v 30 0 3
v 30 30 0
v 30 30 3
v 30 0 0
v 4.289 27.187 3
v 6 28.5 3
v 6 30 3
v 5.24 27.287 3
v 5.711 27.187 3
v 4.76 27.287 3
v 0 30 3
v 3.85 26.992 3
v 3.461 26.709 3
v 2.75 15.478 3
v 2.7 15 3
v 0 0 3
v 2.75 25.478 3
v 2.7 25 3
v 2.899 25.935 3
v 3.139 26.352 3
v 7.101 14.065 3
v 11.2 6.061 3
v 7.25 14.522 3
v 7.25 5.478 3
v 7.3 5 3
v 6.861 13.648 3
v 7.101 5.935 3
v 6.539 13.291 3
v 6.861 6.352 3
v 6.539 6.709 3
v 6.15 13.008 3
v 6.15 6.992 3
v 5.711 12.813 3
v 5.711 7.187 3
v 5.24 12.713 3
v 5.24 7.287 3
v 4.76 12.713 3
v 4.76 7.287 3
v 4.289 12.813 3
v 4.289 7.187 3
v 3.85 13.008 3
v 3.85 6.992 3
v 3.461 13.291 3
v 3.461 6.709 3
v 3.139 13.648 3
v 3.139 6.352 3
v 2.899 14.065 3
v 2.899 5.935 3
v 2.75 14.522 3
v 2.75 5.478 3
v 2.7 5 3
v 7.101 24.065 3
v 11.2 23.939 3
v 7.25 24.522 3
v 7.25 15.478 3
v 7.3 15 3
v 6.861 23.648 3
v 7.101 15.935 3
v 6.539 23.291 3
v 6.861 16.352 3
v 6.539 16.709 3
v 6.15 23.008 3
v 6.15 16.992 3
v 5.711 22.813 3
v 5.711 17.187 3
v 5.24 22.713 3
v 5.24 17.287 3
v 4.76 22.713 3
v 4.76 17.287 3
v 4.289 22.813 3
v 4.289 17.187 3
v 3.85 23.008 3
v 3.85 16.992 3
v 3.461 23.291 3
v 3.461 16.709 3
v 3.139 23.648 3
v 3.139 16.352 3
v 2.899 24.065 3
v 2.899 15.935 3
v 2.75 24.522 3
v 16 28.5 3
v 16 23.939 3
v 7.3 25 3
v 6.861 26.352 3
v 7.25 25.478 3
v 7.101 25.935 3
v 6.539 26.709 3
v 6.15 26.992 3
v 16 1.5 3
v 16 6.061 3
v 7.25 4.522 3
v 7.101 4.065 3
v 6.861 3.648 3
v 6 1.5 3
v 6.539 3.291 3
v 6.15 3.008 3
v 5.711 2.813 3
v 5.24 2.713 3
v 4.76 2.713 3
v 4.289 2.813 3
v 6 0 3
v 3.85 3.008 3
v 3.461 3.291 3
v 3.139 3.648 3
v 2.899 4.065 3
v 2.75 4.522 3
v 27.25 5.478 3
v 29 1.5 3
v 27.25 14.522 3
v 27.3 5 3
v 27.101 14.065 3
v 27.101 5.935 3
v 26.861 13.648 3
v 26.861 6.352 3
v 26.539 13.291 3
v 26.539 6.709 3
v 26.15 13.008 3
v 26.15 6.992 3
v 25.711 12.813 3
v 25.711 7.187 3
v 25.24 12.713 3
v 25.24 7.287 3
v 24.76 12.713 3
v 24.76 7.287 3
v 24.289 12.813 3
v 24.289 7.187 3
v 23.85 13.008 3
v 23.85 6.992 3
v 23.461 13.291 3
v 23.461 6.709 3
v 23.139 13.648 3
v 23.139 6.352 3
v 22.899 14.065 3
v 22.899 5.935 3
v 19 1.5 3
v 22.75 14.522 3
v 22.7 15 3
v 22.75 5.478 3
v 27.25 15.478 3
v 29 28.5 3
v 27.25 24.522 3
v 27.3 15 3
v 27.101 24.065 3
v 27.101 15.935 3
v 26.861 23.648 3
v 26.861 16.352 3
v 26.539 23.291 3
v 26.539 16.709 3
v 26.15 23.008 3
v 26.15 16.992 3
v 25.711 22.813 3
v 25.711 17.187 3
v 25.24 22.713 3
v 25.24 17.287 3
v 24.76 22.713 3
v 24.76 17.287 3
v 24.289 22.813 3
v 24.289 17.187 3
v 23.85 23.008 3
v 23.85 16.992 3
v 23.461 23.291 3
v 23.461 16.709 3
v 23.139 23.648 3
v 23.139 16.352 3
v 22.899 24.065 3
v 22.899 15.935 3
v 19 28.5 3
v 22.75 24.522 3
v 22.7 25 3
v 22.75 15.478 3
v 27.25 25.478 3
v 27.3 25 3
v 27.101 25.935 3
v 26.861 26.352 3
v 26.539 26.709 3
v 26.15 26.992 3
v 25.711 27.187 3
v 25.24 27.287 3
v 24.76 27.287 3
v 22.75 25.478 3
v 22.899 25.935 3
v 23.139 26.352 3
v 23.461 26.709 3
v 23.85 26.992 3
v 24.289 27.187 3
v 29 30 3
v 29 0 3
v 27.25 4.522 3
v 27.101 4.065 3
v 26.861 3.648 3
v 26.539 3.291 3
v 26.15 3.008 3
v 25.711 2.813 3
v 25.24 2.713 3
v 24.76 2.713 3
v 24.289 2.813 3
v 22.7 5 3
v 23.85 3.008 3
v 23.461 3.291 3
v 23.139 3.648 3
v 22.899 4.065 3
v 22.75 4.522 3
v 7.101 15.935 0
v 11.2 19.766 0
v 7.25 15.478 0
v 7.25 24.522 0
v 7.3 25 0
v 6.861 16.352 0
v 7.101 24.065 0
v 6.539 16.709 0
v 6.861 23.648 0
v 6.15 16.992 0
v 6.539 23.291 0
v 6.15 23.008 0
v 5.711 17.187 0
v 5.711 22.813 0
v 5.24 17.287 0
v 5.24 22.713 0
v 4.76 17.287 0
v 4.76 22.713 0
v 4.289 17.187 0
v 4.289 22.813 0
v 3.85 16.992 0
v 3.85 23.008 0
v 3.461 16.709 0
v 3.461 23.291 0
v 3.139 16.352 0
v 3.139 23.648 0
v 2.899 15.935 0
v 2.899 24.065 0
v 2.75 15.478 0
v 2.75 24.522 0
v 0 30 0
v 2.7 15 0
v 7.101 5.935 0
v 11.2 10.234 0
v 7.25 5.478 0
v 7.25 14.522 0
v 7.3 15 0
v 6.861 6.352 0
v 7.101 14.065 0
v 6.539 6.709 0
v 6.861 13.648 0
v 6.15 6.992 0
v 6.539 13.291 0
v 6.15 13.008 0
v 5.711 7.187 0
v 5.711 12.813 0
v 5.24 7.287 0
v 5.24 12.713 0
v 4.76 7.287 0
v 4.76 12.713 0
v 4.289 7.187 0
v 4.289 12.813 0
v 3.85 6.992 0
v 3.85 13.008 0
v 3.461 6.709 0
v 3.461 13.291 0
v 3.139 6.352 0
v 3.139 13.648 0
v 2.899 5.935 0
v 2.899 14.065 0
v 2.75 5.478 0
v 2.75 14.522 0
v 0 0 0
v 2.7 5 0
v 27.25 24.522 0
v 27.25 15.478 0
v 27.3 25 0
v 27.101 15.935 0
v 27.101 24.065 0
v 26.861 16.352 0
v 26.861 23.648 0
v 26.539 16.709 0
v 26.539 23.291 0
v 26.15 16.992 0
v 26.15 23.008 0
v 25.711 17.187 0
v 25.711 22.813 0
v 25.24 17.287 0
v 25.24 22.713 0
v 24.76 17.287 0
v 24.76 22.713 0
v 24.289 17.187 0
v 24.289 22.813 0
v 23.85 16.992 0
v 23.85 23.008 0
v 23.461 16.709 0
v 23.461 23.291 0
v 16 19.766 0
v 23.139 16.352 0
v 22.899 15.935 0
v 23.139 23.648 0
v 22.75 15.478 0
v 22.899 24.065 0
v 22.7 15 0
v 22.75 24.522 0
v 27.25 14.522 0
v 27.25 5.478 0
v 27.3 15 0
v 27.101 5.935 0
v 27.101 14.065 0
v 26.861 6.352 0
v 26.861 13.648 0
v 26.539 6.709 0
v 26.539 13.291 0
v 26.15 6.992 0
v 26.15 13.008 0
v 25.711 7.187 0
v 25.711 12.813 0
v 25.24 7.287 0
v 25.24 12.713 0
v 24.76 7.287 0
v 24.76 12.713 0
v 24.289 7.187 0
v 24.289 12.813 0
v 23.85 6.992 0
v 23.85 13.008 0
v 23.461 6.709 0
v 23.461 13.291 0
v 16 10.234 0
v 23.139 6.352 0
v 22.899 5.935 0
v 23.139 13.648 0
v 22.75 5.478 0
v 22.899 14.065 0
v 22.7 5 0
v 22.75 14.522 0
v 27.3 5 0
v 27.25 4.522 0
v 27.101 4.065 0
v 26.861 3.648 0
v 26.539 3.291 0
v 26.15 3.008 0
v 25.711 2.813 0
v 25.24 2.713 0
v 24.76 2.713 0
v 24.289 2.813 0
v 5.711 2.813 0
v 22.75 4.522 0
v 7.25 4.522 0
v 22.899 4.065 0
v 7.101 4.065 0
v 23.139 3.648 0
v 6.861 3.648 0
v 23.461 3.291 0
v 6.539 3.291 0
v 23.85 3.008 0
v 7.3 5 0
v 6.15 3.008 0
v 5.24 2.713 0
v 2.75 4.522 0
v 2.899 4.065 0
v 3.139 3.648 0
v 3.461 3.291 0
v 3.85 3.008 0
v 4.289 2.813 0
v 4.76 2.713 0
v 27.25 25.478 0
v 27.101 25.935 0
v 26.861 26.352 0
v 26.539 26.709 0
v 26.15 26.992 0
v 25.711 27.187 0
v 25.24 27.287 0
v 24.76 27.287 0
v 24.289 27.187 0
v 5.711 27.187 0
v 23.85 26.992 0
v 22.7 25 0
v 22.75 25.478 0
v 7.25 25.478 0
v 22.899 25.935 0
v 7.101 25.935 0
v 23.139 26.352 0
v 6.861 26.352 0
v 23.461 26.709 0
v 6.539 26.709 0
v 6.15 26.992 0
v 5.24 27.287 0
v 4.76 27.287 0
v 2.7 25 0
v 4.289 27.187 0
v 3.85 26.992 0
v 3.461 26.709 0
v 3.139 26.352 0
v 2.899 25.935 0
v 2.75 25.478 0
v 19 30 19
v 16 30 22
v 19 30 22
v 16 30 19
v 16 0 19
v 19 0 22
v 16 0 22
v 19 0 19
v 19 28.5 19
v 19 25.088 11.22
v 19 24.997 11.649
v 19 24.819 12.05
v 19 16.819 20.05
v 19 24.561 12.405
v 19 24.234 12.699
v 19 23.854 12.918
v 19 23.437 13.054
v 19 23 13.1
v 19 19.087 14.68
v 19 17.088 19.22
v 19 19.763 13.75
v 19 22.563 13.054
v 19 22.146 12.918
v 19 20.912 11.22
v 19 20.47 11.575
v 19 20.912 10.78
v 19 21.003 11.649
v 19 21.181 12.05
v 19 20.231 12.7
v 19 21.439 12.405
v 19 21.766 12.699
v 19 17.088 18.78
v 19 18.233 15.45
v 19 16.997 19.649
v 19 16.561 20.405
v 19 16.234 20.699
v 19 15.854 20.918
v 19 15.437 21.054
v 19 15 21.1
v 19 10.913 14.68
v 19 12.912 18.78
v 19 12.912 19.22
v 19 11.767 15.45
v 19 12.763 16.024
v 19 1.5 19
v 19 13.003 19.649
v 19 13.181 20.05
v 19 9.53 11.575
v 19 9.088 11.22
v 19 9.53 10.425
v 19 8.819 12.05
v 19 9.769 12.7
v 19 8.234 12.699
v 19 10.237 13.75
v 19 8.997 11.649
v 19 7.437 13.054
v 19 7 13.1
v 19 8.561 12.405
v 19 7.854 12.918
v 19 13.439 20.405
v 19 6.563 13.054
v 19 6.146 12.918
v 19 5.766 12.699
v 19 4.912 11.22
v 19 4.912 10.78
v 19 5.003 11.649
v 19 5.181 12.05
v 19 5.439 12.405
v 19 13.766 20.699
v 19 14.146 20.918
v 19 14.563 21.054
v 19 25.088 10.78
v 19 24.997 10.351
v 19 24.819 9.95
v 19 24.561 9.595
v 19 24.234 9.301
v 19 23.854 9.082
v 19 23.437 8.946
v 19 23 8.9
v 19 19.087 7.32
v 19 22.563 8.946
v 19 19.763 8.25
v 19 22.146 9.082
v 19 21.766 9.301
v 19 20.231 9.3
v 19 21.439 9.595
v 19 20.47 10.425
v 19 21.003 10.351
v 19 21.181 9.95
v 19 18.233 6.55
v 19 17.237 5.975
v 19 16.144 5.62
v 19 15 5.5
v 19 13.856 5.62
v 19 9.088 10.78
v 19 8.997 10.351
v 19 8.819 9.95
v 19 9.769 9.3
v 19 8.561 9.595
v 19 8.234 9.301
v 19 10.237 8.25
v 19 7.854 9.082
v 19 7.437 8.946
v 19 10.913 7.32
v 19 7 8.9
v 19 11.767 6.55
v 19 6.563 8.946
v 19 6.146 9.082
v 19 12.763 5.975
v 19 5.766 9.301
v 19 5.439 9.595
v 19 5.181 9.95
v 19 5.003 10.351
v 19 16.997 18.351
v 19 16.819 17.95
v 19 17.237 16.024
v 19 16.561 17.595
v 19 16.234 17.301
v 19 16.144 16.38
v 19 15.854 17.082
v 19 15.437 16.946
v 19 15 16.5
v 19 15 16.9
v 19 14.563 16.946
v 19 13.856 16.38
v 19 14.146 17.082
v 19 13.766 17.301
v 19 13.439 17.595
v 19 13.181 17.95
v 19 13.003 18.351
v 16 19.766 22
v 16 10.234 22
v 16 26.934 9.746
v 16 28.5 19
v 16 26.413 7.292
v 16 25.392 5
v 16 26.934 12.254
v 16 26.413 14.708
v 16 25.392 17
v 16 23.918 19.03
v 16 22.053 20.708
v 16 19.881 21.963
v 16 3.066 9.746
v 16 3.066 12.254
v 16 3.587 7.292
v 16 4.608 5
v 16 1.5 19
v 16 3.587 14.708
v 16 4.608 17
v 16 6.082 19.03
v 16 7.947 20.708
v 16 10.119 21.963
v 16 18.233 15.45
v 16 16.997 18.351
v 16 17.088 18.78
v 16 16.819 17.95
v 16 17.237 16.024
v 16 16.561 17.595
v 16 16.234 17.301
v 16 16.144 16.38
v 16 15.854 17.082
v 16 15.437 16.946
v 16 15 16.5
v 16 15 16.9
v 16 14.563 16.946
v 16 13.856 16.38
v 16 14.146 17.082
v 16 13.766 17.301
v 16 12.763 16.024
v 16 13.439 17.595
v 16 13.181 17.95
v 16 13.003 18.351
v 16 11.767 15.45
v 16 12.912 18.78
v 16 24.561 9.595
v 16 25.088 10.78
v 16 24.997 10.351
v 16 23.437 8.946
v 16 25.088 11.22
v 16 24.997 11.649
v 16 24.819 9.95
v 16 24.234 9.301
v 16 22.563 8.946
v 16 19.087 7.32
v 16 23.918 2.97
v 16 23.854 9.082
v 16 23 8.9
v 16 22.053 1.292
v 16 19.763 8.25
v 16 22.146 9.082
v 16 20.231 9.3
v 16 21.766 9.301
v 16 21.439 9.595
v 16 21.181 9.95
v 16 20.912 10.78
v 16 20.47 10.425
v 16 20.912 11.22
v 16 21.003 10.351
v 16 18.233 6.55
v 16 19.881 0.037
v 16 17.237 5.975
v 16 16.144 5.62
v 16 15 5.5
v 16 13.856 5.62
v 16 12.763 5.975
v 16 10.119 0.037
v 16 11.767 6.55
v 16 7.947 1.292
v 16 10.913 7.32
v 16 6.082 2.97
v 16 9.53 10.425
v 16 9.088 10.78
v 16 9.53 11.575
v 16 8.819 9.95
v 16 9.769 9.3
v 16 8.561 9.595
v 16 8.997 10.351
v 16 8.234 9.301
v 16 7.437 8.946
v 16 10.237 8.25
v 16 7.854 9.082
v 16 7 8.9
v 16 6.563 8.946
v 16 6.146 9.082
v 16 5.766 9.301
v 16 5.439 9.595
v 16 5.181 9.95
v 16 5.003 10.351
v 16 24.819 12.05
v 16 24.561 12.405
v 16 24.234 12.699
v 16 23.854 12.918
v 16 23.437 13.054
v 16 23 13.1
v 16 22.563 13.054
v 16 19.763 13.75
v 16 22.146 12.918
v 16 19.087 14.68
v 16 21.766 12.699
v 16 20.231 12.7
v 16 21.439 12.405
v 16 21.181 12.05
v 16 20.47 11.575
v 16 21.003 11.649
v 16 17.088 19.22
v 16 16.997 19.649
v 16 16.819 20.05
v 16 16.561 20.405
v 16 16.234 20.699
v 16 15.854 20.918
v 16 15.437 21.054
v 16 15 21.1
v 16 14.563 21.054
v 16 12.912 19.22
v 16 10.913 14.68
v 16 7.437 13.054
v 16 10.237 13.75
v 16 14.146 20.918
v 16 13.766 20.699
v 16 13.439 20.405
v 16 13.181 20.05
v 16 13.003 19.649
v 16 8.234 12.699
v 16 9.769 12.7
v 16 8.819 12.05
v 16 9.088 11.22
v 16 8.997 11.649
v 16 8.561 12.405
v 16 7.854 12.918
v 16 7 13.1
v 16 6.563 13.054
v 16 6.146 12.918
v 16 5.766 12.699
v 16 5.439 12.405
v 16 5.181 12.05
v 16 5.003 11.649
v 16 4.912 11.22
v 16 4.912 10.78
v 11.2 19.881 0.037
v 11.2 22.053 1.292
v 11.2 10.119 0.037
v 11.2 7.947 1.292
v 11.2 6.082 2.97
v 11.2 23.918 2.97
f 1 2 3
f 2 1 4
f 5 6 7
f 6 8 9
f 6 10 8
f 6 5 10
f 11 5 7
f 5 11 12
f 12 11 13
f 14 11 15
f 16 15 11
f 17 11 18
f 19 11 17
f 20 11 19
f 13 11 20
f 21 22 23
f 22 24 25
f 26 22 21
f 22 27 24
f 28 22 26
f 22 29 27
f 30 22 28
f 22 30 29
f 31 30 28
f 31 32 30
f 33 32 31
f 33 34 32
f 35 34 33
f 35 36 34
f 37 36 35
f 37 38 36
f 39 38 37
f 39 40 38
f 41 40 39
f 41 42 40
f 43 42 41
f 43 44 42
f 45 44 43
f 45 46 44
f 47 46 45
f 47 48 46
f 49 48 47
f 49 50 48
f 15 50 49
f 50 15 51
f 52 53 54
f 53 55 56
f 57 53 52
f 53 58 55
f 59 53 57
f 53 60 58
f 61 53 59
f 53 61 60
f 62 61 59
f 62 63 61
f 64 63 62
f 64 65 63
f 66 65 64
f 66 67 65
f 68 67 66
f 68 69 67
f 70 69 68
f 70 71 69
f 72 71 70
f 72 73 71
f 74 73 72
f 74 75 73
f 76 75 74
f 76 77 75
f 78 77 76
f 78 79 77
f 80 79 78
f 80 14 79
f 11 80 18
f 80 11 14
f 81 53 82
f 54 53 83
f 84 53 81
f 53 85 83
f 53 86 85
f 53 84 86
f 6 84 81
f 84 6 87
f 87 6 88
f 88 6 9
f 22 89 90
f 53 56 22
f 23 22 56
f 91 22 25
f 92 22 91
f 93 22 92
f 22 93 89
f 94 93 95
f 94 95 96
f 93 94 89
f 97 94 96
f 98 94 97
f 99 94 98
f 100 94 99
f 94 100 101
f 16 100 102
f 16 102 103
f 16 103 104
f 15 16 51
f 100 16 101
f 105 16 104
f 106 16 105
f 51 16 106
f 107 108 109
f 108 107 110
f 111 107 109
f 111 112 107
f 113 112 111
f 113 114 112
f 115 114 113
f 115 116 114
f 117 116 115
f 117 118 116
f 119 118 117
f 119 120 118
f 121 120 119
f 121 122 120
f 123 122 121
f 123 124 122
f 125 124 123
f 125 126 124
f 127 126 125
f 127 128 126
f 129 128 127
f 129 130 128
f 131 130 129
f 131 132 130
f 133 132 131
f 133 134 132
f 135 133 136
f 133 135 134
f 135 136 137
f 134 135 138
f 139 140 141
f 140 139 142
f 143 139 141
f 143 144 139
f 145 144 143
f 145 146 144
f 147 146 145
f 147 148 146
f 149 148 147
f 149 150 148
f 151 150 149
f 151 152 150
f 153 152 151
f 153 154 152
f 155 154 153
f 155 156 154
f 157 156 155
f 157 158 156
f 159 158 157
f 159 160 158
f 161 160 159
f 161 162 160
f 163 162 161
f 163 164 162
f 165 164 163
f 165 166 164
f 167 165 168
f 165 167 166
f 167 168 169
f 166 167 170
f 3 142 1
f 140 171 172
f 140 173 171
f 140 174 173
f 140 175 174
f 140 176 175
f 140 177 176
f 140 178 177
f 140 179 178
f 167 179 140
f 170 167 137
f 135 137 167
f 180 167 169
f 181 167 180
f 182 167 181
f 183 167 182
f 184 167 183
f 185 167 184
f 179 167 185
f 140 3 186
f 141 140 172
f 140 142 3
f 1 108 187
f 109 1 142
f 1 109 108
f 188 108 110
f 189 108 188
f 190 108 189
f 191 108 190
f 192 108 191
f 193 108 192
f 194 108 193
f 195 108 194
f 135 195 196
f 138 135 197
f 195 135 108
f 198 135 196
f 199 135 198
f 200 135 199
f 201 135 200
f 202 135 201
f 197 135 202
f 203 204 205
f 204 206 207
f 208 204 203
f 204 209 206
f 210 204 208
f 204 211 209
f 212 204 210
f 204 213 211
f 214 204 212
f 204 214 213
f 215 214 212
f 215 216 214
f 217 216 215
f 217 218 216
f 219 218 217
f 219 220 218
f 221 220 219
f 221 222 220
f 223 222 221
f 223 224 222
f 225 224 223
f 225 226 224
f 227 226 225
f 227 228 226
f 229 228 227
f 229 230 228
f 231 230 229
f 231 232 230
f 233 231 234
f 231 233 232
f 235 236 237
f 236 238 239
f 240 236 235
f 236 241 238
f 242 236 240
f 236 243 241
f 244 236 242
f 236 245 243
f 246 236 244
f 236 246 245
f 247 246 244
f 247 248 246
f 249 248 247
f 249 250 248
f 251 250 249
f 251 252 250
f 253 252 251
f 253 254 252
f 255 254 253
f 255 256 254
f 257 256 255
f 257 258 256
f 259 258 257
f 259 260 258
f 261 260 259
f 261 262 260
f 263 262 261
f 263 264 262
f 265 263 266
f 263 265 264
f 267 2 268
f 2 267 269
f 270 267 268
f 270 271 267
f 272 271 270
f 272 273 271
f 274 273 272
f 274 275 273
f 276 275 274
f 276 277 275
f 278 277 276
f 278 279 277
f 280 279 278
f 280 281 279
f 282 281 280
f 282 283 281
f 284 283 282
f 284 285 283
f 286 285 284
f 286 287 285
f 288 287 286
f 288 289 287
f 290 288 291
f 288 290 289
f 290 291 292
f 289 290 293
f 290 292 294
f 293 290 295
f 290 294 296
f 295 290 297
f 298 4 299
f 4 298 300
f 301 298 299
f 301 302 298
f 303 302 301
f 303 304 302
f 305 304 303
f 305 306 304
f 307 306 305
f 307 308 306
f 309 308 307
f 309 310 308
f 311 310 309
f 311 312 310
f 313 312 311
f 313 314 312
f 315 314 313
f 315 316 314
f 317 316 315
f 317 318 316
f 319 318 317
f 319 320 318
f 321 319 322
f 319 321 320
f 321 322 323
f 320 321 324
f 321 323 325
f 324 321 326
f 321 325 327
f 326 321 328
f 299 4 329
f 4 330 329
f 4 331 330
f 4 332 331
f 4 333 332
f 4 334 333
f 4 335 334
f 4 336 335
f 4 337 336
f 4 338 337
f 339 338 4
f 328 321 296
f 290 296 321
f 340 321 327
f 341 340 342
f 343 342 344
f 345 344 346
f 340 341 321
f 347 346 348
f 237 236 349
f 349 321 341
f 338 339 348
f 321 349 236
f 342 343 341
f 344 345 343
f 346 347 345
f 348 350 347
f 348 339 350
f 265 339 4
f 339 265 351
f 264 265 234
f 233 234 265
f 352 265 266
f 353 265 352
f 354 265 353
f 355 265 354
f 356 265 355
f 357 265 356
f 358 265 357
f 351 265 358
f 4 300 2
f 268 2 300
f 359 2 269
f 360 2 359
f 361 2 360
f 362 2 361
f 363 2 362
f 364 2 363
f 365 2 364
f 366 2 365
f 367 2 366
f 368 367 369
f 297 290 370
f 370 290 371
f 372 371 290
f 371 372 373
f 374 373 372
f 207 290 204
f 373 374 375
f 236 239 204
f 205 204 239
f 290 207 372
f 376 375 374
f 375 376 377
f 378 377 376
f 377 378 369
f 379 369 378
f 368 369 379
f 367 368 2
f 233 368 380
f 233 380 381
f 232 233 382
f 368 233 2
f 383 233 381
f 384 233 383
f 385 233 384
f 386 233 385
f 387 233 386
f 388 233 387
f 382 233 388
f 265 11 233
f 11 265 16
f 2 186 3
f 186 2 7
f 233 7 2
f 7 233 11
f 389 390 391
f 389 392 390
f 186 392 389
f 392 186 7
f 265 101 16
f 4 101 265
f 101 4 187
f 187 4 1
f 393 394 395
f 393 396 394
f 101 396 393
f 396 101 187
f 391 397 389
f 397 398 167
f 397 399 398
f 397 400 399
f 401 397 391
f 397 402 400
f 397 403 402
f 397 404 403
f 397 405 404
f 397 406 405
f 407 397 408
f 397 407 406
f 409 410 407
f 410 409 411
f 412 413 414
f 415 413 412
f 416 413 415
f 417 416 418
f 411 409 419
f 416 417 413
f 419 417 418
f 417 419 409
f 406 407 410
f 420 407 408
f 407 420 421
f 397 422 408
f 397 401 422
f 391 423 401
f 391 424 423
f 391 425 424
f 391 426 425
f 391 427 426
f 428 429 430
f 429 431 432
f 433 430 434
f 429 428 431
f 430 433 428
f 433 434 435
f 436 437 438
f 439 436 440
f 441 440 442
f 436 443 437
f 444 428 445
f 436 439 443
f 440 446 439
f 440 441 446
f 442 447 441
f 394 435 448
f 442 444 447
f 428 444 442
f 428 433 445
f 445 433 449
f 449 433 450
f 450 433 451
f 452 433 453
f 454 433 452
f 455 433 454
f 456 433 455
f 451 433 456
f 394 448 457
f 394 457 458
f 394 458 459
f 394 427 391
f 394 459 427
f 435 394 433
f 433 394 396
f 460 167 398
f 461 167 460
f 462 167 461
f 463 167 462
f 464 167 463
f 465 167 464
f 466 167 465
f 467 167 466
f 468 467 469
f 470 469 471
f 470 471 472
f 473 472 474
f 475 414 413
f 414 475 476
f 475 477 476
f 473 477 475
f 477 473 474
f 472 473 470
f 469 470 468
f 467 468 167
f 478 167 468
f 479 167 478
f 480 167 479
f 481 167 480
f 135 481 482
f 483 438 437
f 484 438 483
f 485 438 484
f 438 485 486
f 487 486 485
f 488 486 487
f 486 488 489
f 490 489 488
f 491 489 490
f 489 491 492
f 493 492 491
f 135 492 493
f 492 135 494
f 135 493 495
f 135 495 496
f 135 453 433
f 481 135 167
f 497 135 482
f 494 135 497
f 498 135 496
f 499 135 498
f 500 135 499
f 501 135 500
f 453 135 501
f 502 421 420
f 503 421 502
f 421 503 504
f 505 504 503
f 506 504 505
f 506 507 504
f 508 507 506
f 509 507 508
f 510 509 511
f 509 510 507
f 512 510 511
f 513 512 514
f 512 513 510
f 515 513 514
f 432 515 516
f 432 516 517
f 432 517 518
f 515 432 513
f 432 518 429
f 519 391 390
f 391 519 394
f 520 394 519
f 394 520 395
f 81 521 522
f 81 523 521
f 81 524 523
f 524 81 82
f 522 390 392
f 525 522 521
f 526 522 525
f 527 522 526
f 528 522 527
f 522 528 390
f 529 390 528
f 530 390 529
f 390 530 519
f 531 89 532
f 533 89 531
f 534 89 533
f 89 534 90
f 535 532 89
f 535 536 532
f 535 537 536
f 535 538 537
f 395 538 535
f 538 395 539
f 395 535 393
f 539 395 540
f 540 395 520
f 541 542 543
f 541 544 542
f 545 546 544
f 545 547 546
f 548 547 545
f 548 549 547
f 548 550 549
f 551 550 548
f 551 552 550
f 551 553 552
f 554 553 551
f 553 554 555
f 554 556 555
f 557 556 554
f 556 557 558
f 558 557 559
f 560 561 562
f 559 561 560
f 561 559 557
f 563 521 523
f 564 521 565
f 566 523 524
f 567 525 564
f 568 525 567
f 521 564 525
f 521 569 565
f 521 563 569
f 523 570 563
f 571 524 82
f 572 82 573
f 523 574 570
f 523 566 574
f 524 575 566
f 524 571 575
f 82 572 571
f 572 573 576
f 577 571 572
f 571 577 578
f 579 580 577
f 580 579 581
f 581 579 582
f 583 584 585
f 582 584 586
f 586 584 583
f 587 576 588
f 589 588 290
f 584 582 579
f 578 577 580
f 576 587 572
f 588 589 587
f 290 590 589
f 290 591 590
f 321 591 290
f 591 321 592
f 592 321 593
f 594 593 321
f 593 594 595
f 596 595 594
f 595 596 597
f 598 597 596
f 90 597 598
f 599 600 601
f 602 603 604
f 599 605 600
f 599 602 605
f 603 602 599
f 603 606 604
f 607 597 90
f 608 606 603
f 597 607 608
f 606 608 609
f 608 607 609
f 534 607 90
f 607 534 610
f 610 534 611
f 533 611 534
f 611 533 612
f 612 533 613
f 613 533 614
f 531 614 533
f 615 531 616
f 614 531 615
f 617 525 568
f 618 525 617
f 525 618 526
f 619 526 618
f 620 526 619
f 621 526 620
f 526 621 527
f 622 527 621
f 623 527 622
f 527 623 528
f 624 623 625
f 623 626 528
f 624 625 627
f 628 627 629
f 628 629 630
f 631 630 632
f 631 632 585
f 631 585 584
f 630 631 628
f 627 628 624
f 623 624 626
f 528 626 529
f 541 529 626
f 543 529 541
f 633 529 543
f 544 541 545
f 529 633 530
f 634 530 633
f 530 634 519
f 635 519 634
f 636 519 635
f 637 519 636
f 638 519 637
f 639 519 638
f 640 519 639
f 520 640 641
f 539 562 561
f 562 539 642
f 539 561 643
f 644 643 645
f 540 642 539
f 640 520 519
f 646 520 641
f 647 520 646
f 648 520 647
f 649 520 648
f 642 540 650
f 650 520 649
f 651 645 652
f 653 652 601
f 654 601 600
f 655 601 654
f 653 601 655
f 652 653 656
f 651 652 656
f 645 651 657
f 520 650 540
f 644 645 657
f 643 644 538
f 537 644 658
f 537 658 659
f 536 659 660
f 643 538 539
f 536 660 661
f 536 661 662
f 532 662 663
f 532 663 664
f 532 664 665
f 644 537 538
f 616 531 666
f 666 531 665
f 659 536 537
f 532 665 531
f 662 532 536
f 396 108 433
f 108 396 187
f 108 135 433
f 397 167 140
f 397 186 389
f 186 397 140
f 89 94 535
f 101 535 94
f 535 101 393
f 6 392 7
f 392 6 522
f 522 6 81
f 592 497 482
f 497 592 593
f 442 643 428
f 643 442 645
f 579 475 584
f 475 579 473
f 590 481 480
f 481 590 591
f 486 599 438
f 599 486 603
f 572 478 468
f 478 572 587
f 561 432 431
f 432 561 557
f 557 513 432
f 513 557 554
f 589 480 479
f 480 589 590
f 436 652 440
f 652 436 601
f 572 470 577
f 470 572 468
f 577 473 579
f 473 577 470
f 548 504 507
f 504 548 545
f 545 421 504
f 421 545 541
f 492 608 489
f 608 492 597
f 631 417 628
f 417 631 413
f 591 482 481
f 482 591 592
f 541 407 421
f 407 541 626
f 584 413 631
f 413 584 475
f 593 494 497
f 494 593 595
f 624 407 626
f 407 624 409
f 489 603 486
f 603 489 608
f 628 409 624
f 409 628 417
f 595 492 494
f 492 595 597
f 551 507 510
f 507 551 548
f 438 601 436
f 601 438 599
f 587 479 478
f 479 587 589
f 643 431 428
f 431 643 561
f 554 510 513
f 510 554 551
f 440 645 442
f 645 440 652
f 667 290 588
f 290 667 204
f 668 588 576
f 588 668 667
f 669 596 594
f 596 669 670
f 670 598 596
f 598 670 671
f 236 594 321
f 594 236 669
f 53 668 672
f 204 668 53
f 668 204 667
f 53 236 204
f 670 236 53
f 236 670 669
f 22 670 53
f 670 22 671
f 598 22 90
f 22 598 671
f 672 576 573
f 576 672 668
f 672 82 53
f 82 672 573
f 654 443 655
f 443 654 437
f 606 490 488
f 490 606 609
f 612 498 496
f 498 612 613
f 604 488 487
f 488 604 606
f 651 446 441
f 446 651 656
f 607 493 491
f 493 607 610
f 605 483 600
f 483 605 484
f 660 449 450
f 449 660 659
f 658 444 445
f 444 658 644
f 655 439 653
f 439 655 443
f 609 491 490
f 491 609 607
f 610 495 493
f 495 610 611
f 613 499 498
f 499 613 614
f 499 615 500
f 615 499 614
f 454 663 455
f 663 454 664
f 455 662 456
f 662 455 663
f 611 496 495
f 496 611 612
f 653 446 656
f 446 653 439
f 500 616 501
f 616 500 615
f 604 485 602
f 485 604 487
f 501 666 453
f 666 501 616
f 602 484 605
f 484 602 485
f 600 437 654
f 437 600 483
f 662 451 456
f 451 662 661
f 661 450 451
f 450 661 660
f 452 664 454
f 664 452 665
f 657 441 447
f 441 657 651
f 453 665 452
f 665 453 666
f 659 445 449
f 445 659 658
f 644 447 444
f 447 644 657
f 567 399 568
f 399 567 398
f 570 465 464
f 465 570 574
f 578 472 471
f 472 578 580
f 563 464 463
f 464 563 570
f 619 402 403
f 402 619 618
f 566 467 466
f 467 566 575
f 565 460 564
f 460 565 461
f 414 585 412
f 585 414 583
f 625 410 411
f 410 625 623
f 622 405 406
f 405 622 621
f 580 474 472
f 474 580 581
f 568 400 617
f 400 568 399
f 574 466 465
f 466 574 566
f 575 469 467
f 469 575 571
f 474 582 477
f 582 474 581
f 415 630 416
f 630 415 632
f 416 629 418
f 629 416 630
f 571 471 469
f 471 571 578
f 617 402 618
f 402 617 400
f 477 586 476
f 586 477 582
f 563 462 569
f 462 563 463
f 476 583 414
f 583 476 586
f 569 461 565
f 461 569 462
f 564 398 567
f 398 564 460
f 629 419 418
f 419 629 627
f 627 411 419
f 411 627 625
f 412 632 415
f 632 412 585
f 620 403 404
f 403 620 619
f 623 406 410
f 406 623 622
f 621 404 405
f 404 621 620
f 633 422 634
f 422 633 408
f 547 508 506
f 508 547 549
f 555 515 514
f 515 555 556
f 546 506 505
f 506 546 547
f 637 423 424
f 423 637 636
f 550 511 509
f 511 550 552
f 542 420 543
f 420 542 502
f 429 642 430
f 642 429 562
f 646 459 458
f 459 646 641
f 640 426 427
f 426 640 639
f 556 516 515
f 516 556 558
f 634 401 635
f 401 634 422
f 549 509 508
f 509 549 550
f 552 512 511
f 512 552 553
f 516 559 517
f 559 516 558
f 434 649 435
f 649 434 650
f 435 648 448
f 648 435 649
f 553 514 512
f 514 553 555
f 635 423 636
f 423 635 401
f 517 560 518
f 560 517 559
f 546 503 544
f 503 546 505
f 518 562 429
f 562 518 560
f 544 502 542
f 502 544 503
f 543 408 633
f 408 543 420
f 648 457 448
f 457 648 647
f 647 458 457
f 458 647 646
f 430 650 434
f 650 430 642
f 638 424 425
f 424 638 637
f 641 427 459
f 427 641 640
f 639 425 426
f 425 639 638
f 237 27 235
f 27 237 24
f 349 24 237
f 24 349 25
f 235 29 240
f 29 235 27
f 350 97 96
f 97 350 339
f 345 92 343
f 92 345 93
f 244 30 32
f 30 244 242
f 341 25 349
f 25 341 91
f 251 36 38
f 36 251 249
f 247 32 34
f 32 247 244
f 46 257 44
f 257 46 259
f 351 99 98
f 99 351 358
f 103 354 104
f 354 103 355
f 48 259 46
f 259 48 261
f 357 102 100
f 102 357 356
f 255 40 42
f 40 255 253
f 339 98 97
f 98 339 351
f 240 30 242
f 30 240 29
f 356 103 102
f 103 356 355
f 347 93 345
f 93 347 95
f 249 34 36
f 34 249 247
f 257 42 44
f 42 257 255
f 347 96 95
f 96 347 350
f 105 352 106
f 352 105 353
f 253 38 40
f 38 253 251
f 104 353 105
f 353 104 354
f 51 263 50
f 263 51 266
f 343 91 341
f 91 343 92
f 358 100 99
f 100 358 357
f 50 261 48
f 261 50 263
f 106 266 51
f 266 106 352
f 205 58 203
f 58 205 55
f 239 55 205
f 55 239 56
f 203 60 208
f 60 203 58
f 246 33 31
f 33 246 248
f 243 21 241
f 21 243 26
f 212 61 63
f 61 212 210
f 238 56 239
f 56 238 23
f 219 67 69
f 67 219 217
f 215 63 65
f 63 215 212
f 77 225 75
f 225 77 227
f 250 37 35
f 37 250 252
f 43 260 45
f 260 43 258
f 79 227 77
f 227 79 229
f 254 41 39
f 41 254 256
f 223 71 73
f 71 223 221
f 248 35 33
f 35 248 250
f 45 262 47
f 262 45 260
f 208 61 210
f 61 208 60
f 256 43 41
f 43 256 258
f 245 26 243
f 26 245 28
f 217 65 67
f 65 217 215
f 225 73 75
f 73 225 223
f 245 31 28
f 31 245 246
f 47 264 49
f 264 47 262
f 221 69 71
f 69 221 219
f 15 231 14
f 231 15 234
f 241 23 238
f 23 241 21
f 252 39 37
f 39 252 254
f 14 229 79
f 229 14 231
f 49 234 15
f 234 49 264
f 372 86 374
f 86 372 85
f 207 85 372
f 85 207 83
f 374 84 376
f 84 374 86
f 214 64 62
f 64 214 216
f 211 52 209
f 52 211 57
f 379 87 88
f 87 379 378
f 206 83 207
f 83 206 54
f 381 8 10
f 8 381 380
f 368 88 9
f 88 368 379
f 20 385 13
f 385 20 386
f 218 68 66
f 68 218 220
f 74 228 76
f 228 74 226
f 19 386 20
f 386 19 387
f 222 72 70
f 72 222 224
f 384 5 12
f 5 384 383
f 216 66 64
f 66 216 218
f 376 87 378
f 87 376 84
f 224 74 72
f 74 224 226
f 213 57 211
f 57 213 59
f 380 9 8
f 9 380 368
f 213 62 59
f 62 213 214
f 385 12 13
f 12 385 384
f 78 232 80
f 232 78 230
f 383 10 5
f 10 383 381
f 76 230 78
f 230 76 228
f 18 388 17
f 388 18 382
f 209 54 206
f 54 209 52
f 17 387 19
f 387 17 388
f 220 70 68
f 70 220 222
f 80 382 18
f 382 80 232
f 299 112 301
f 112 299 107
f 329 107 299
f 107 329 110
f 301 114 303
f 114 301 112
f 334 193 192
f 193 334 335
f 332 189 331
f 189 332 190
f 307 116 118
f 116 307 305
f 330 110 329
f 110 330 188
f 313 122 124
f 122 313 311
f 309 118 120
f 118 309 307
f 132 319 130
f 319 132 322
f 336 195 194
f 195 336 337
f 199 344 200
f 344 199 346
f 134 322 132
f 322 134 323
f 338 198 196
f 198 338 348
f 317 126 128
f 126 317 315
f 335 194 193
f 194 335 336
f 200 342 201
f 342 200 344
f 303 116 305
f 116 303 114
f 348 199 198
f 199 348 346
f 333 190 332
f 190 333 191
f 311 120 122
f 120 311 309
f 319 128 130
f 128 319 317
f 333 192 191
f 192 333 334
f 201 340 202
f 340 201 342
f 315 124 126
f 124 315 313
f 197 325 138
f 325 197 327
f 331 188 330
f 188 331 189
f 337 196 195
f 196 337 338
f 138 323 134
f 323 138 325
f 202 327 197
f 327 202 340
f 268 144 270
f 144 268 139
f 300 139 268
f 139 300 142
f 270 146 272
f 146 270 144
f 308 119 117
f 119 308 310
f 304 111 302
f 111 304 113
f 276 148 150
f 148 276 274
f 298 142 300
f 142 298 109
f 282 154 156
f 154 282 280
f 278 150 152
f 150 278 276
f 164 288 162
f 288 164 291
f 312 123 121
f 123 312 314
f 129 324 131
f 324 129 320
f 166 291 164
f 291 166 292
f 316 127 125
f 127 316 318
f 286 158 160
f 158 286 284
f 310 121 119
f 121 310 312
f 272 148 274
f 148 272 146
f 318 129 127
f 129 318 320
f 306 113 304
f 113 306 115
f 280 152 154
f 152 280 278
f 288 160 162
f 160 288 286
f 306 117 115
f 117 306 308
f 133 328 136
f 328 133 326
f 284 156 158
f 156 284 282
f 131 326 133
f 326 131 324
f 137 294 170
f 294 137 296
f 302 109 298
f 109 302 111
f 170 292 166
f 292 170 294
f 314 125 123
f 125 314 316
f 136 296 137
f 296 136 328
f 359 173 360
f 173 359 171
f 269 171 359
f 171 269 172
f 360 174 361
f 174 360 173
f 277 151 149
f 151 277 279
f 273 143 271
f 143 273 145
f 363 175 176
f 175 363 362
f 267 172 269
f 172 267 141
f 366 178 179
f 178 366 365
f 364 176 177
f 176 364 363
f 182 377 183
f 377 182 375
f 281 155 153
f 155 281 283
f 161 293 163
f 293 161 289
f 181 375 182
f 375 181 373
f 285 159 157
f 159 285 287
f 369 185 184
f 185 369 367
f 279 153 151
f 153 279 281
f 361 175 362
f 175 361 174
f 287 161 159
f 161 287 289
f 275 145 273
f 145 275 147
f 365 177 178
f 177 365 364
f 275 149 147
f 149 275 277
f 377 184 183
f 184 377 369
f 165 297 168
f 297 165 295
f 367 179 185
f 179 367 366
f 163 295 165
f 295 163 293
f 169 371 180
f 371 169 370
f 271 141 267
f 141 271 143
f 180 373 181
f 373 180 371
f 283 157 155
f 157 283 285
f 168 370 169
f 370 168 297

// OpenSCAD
$fn = 30;

x_a = 30;
y_a = 30;
z_1 = 3.0;

d_1 = 11.0;  r_1 = d_1 / 2;
d_2 = 22.0;  r_2 = d_2 / 2;
r_mh = 2.1; l_mh = 8.0;
r_mh2 = 2.3;
z_a = d_2;
z_2 = z_a - z_1;
x_v = 16;
x_w = 3.0;

x_c = x_a / 2;
y_c = y_a / 2;

cf_w = 1.5; cf_h = 10;

rot_y = [0,90,0];

// TODO: to lib
module conterforce( w, h=1.0 )
{
polyhedron( 
  points=[
    [0,-h,0],[0,0,0],[0,0,h],
    [w,-h,0],[w,0,0],[w,0,h]],
  faces=[
    [0,1,2],[0,2,5,3],[3,5,4],
    [0,3,4,1],[1,4,5,2]
  ]);
}

module coord_x_nut_holder() {
  difference() {
    union() {
      cube( [x_a, y_a, z_1] );
      translate( [x_v,0,z_1] ) cube ([x_w,y_a,z_2]);
      translate( [x_v+x_w,0,z_1] ) rotate([0,0,90]) scale([1,1,1.6]) conterforce( cf_w, cf_h );
      translate( [x_v+x_w,y_a-cf_w,z_1] ) rotate([0,0,90]) scale([1,1,1.6]) conterforce( cf_w, cf_h );
      translate( [x_v,cf_w,z_1] ) rotate([0,0,-90]) scale([1,1,1.6]) conterforce( cf_w, cf_h );
      translate( [x_v,y_a,z_1] ) rotate([0,0,-90]) scale([1,1,1.6]) conterforce( cf_w, cf_h );
    }

    // axis
    translate([x_v,y_c,r_2]) rotate(rot_y) cylinder( r=r_1, h=x_w );
    translate([x_v-x_w*1.6,y_c,r_2]) rotate(rot_y) cylinder( r=r_2+1.0, h=x_w*1.6 );
    translate([x_v,y_c-l_mh,r_2]) rotate(rot_y) cylinder( r=r_mh, h=x_w );
    translate([x_v,y_c+l_mh,r_2]) rotate(rot_y) cylinder( r=r_mh, h=x_w );
    translate([x_v,y_c,r_2+l_mh]) rotate(rot_y) cylinder( r=r_mh, h=x_w );
    
    // mount
    translate([ 5, 5,0]) cylinder( r=r_mh2, h=z_1 );
    translate([ 5,15,0]) cylinder( r=r_mh2, h=z_1 );
    translate([ 5,25,0]) cylinder( r=r_mh2, h=z_1 );
    translate([25, 5,0]) cylinder( r=r_mh2, h=z_1 );
    translate([25,15,0]) cylinder( r=r_mh2, h=z_1 );
    translate([25,25,0]) cylinder( r=r_mh2, h=z_1 );
    
  }

}

coord_x_nut_holder();

echo( );
